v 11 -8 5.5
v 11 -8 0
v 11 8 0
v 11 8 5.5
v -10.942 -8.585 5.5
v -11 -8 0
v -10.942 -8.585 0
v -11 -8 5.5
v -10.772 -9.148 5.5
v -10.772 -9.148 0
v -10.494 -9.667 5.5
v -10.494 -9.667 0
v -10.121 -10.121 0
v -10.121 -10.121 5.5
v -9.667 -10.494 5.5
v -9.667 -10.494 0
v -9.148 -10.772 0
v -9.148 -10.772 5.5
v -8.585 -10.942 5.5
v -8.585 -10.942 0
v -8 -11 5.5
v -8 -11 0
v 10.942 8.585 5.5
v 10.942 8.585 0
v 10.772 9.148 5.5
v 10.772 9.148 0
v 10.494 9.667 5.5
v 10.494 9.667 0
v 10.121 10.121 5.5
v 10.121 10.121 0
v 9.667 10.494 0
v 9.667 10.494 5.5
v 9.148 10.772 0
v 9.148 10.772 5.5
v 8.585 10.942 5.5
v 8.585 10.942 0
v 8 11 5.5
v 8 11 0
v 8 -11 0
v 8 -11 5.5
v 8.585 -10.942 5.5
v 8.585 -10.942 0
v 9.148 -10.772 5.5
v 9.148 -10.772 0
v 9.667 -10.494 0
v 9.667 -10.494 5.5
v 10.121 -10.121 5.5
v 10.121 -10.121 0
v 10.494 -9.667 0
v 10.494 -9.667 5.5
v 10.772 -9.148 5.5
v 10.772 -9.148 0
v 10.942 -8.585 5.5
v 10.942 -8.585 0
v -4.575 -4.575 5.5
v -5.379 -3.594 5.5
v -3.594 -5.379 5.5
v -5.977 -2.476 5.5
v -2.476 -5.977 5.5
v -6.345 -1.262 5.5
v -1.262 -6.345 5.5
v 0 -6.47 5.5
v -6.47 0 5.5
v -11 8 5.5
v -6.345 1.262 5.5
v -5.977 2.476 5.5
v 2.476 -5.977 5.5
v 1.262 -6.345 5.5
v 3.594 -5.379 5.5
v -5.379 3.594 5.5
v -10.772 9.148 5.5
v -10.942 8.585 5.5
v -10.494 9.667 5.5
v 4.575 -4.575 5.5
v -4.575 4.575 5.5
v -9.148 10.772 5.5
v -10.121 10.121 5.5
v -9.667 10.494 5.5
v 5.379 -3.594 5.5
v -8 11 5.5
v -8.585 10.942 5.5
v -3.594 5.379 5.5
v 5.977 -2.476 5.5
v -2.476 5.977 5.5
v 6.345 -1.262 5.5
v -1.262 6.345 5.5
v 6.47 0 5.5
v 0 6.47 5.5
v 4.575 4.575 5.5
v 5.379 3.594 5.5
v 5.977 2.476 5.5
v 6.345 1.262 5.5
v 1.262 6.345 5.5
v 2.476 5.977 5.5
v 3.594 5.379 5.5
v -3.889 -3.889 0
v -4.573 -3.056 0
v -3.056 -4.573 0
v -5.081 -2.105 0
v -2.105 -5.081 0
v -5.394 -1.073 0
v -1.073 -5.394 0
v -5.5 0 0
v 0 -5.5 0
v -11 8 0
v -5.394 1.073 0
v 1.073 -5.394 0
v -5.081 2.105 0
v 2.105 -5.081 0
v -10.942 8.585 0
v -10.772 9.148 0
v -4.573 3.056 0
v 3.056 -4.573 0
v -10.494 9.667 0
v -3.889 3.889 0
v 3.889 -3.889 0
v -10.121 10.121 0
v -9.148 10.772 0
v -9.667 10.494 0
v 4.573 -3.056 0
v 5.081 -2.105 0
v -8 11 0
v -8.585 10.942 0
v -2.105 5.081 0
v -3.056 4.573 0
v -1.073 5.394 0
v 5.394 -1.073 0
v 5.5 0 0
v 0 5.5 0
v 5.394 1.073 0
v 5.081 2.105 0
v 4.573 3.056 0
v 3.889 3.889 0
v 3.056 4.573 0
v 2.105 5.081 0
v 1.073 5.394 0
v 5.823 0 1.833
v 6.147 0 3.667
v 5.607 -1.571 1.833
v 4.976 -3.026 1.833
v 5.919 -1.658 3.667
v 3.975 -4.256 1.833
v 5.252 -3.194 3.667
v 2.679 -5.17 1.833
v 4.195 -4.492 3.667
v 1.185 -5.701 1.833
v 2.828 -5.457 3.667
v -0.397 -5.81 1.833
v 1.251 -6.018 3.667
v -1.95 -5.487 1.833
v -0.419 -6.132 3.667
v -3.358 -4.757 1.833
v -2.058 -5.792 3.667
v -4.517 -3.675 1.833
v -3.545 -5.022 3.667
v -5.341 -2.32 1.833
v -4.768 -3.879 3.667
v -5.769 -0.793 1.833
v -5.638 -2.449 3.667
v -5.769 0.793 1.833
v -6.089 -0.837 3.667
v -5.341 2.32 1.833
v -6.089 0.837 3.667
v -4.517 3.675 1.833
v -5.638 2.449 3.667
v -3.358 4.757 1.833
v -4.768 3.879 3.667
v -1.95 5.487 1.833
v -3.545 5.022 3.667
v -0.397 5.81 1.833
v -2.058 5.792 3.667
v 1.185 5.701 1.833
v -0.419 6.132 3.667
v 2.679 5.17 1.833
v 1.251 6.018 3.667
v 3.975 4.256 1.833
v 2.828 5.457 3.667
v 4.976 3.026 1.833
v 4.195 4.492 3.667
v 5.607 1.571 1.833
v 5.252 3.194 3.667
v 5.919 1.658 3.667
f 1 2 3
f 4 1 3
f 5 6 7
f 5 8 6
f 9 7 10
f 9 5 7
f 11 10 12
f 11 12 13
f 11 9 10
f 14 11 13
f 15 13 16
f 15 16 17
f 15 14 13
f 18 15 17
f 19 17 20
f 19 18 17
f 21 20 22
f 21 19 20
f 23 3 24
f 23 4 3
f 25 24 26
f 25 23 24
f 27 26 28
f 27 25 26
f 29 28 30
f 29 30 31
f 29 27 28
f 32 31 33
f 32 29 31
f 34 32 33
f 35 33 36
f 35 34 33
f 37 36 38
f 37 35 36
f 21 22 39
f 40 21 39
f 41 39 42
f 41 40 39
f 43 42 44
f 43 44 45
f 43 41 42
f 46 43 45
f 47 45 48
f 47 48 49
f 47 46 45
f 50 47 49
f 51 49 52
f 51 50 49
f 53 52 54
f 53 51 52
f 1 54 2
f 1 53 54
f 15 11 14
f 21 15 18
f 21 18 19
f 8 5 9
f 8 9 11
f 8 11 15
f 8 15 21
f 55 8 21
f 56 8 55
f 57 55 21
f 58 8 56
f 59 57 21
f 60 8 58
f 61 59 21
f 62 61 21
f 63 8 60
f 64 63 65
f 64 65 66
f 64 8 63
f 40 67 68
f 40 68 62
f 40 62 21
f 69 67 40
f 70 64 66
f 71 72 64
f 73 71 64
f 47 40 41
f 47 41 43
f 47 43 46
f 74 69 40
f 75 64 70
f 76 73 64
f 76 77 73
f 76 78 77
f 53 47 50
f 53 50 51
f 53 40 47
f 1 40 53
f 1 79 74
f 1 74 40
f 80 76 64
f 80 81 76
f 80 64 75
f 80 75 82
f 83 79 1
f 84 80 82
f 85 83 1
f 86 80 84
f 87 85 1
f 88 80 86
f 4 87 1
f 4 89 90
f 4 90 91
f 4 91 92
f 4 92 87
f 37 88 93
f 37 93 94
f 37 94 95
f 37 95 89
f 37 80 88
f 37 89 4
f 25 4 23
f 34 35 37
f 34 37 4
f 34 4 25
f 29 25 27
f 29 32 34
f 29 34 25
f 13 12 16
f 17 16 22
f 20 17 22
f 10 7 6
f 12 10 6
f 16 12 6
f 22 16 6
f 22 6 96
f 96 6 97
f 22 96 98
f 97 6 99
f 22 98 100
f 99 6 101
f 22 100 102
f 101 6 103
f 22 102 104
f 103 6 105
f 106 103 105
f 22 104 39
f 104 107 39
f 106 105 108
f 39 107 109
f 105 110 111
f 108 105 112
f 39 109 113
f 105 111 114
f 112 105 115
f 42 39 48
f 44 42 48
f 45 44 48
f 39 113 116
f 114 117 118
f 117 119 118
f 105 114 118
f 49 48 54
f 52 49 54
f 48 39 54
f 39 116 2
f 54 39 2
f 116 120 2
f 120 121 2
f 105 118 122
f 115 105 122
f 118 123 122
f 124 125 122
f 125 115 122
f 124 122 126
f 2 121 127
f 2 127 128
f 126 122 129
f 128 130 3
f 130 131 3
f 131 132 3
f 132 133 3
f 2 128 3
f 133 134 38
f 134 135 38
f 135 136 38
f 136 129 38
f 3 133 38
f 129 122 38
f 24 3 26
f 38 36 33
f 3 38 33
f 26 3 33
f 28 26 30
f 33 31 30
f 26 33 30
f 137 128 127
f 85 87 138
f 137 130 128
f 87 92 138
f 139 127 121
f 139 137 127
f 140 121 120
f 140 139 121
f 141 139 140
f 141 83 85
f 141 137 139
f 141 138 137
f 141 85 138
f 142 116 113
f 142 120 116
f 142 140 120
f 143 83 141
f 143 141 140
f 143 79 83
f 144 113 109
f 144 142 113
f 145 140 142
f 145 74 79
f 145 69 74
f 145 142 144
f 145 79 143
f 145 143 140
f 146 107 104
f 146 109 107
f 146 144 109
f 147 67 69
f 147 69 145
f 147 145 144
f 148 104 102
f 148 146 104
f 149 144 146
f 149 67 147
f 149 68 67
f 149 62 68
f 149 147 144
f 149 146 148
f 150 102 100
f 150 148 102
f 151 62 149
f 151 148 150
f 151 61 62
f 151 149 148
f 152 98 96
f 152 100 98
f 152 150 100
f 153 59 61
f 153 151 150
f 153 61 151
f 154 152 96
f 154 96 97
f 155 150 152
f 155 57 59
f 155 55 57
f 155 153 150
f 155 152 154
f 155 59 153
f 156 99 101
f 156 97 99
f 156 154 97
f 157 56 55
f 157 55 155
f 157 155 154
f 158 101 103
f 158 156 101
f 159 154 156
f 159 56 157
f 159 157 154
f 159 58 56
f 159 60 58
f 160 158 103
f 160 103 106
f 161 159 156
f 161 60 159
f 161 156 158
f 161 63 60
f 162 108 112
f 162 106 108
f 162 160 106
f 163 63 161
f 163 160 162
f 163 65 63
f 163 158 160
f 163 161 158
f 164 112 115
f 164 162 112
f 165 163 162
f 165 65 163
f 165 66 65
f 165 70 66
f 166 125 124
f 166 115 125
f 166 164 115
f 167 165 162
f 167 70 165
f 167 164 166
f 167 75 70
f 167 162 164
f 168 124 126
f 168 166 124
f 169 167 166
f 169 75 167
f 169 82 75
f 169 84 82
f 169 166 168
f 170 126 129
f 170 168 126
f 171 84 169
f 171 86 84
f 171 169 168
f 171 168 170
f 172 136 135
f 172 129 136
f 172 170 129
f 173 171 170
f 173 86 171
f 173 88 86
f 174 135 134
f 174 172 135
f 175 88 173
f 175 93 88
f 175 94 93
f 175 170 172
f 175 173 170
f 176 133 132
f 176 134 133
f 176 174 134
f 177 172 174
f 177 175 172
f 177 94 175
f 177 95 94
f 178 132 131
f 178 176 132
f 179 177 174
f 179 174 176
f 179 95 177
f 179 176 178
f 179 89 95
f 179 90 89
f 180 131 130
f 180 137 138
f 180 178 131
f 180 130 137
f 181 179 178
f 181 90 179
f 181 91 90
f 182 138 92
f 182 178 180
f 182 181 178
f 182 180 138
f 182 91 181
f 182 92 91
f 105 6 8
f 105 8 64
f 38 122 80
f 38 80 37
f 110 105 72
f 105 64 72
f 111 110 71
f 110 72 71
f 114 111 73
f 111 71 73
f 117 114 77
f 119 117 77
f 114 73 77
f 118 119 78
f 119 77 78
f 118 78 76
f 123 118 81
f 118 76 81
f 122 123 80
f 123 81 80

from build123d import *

# Parameters (mm, degrees)
F3_W     = 22
F3_H     = 22
F4_DEPTH = 5.5
F5_R     = 3
F6_R     = 5.5
F7_DEPTH = 5.5
F7_TAPER = -10


with BuildPart() as f4:
    # F3 (on Top) → F4 (new body)
    with BuildSketch(Plane.XY):
        Rectangle(F3_W, F3_H)
    extrude(amount=F4_DEPTH)

    # F5
    f5_edges = [f4.edges().sort_by_distance(p)[0] for p in [
        (11, -11, 2.75),
        (11, 11, 2.75),
        (-11, 11, 2.75),
        (-11, -11, 2.75),
    ]]
    fillet(f5_edges, radius=F5_R)

    # F6 (on face) → F7 (cut, through all)
    with BuildSketch(Plane(origin=(0, 0, 0), x_dir=(1, 0, 0), z_dir=(0, 0, -1))):
        Circle(F6_R)
    extrude(amount=-F7_DEPTH, taper=F7_TAPER, mode=Mode.SUBTRACT)


solid = f4.part
